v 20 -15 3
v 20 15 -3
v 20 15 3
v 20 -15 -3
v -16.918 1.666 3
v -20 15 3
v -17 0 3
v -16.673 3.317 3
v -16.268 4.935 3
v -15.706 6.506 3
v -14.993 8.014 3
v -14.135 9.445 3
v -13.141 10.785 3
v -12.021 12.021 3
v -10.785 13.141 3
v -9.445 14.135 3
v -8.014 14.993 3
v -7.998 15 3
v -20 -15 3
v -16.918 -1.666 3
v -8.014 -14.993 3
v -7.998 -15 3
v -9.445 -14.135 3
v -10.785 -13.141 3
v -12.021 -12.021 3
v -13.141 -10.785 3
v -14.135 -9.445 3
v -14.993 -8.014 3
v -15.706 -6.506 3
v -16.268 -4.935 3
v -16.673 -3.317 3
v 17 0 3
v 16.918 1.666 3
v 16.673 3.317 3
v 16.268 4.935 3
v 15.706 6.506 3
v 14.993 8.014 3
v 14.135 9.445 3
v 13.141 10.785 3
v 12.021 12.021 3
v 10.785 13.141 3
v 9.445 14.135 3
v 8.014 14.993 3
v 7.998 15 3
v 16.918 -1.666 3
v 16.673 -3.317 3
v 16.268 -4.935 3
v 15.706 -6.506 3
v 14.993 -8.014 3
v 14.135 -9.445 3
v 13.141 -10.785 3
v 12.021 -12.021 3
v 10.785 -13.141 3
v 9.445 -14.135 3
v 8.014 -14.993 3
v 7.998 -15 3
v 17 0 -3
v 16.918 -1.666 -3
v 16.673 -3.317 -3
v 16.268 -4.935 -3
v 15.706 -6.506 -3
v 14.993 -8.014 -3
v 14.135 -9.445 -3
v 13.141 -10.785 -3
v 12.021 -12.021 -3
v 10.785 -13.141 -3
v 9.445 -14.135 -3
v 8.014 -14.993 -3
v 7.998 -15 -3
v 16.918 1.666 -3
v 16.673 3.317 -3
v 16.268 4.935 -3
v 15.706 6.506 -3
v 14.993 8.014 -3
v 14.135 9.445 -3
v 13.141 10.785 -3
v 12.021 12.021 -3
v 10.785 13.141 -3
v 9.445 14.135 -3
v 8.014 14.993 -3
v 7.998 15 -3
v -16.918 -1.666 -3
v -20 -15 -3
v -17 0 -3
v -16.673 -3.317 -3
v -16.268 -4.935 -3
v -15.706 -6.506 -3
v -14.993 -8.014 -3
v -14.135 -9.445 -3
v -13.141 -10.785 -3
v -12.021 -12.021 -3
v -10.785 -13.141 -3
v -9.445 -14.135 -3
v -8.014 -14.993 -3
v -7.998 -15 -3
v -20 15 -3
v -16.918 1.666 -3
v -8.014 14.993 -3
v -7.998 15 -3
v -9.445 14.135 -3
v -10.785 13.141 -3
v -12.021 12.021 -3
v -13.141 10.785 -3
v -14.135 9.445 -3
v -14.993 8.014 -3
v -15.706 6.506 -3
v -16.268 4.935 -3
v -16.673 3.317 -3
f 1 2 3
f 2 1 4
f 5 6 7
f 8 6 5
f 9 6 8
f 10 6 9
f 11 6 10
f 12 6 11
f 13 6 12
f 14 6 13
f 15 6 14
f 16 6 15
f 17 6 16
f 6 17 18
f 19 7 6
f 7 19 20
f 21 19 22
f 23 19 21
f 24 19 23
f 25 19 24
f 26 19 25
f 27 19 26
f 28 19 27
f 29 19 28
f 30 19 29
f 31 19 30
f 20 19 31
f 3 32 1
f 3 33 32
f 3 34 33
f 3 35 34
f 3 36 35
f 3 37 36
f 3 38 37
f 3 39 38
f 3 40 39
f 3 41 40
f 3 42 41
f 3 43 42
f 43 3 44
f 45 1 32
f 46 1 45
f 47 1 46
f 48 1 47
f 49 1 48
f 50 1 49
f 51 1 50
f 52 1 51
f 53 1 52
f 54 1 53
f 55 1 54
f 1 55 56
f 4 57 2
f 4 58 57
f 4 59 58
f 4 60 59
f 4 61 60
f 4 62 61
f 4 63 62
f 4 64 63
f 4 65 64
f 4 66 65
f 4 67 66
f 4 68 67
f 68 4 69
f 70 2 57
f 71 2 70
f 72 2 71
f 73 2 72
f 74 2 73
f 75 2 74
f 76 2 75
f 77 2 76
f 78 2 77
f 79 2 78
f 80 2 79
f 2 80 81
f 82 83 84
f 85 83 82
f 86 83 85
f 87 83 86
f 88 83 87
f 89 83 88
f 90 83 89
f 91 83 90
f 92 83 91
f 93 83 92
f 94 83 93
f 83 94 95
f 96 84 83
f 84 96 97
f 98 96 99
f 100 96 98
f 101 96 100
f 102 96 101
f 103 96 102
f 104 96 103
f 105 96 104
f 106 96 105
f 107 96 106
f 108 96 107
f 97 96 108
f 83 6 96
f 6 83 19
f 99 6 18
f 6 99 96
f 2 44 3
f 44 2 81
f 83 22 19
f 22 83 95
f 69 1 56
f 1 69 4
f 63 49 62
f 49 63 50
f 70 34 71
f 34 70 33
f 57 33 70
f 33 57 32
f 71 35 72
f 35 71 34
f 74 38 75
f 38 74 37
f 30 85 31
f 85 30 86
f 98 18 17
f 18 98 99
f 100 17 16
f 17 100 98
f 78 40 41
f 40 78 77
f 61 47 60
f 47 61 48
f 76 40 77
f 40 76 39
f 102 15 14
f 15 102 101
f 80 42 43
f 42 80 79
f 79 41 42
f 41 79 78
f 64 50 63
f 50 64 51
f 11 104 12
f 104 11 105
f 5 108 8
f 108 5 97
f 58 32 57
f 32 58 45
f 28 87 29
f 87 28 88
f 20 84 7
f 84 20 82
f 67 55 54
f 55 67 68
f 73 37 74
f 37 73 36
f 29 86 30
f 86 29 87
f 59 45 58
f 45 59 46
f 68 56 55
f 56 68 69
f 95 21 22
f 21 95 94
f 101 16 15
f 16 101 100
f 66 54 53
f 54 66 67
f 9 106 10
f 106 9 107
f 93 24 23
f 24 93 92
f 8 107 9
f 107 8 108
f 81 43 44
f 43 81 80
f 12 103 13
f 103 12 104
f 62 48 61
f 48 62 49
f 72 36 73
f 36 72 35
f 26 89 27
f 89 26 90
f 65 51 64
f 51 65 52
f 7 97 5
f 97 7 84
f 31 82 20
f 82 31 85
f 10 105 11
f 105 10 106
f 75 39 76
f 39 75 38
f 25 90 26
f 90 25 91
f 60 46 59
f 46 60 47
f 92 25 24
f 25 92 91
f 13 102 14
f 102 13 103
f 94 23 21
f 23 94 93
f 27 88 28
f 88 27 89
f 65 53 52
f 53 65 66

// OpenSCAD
// A mounting spacer: a plate with a central through-bore.

plate_x = 40;
plate_y = 30;
plate_z = 6;
bore_d  = 34;
$fn = 64;

difference() {
    cube([plate_x, plate_y, plate_z], center = true);
    cylinder(h = plate_z + 2, d = bore_d, center = true);
}
